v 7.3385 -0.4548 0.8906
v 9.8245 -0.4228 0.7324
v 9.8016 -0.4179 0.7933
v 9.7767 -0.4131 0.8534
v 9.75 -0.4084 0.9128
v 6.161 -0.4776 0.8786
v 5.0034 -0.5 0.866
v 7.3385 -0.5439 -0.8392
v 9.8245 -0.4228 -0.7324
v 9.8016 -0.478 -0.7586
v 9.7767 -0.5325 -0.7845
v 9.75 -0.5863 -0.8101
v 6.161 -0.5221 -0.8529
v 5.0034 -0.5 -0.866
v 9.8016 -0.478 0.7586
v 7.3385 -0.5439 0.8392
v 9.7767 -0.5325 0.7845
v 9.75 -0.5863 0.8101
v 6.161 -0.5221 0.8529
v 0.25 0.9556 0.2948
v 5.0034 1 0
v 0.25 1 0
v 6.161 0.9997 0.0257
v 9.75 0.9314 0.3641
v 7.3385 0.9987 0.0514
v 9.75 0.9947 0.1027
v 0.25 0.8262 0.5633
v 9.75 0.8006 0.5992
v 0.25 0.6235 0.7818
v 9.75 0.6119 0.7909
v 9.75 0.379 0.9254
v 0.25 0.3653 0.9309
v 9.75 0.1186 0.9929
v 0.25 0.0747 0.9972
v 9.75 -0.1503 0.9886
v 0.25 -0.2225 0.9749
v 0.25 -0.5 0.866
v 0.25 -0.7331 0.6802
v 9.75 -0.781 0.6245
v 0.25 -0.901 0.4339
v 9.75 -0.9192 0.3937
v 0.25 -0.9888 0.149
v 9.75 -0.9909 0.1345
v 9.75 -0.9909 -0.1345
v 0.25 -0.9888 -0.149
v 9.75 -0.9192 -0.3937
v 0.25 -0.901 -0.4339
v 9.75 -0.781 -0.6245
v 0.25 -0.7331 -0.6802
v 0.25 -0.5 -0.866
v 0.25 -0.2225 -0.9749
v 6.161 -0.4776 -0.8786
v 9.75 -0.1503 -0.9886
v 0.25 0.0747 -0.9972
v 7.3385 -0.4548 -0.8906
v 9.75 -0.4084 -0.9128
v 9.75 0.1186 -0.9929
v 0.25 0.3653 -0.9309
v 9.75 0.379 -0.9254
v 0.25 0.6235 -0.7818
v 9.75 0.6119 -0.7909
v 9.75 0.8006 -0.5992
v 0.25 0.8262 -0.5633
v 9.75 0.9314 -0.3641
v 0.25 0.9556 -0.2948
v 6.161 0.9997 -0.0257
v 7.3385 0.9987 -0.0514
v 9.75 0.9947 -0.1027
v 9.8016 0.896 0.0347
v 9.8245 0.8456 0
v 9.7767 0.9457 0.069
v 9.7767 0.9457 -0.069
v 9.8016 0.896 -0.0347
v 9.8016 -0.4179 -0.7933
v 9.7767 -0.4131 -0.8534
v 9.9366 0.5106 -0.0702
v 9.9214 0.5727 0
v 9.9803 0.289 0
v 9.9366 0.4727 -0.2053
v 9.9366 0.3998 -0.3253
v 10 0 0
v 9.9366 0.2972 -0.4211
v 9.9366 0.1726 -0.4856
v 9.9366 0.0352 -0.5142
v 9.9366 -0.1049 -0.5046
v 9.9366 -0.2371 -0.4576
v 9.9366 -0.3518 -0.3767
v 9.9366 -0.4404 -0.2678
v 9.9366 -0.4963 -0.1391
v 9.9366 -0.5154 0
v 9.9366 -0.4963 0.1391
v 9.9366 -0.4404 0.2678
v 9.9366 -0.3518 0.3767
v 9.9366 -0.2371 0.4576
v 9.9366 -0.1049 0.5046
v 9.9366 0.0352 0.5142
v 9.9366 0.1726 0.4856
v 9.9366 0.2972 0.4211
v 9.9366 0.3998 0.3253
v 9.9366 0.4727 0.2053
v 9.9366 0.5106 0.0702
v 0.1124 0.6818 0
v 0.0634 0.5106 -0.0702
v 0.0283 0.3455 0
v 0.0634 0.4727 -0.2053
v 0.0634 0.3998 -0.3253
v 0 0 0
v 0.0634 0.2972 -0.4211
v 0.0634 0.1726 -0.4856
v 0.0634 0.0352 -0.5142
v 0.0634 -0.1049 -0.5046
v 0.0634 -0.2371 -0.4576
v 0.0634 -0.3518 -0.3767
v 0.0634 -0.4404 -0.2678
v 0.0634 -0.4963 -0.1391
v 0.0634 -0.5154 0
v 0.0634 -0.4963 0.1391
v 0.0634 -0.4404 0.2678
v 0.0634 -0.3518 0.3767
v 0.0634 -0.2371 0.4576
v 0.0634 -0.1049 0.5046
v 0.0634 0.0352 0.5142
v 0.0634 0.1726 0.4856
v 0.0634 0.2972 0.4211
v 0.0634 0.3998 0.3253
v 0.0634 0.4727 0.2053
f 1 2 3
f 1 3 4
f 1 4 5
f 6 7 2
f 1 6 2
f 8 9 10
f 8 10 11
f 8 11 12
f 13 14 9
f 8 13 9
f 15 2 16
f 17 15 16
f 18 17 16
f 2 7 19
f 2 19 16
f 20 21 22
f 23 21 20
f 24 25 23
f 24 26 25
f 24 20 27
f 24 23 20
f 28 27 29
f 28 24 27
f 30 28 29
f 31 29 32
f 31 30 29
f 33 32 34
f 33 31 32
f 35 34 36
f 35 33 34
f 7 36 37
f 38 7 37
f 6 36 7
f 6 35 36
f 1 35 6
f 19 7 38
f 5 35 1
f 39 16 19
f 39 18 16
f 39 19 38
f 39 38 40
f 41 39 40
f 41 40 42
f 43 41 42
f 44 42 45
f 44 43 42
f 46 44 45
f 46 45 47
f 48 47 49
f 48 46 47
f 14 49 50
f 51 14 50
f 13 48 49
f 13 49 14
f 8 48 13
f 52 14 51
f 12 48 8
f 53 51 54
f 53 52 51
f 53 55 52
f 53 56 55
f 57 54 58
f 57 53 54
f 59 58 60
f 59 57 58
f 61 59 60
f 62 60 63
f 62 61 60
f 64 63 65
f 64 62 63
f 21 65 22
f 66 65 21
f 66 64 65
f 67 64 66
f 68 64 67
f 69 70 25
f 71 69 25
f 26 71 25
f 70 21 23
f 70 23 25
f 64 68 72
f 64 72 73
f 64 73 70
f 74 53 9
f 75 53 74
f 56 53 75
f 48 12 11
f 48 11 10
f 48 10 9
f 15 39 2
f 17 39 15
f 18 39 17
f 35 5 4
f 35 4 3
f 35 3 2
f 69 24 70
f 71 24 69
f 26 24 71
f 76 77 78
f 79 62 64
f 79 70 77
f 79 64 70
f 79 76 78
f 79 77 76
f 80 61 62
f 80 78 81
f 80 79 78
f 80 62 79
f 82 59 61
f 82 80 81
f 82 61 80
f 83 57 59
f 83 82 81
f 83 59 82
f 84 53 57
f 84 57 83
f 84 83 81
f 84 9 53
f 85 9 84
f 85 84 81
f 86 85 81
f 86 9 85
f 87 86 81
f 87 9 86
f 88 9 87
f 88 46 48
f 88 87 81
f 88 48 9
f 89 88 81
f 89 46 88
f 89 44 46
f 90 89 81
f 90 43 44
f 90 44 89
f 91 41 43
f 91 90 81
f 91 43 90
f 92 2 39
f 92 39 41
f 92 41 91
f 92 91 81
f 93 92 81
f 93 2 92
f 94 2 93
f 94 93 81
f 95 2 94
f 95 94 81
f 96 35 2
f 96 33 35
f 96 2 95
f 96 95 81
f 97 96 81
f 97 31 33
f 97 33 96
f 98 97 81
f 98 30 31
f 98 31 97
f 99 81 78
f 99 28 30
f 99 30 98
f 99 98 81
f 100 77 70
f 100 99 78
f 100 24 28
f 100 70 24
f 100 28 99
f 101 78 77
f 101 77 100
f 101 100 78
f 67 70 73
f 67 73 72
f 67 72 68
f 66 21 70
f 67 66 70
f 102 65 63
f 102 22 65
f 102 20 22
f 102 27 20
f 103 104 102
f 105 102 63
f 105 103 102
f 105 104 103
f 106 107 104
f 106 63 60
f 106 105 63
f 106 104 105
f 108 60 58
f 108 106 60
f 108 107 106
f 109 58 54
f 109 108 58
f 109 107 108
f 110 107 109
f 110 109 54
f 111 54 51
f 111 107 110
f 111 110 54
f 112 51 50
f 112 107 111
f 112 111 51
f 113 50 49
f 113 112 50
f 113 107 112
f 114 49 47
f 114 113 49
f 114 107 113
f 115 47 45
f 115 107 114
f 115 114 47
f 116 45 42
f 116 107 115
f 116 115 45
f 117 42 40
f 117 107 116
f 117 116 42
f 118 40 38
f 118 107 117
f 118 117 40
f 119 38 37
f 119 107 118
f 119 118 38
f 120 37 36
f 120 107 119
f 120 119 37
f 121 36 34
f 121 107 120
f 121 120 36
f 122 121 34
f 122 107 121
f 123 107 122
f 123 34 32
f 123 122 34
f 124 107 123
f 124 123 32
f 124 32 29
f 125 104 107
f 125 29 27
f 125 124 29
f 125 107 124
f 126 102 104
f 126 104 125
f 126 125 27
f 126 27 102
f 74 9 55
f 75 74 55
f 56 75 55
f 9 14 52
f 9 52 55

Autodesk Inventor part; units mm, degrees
ref_plane "YZ Plane" through (0, 0, 0) normal (1, 0, 0) x (0, 1, 0)
sketch "Skizze1" plane through (0, 0, 0) normal (0, 0, 1) x (1, 0, 0)
  line L0 (0, 0) -> (10, 0)
  line L1 (0.25, 1) -> (9.75, 1)
  arc A0 (0.25, 1) -> (0, 0) centre (2.125, 0) ccw
  arc A1 (10, 0) -> (9.75, 1) centre (7.875, 0) ccw
  line L2 (10, 0) -> (10, 0.84) construction
  line L3 (10, 0.84) -> (5, 1) construction
  line L4 (-12.8617, 0) -> (72.8617, 0) projected
  line L5 (0, 12.1847) -> (0, -2.0308) projected
  point P0 (5, 0)
  dimension "d0" = 2
  dimension "d1" = 10
  dimension "d2" = 1.68
  dimension "d12" = 5
  dimension "d17" = 0.25
  dimension "d18" = 0.25
revolve "Körper" add sketch "Skizze1" angle 360 about axis through (0, 0, 0) along (1, 0, 0)
ref_plane "Work Plane1" through (10, 0, 0) normal (1, 0, 0) x (0, 1, 0)
sketch "Skizze2" plane through (10, 0, 0) normal (1, 0, 0) x (0, 1, 0)
  line L0 (0, -14) -> (0, 14) projected
ref_plane "Work Plane2" through (10, 0, -10) normal (0.9995, -0.032, 0) x (0.032, 0.9995, 0)
sketch "Skizze3" plane through (10, 0, -10) normal (0.9995, -0.032, 0) x (0.032, 0.9995, 0)
  ellipse E0 centre (-0.008, 10) end of major axis (-0.008, 11) minor radius 0.9995 projected
  line L0 (-0.1599, 10) -> (0.8396, 10) projected
  line L1 (0.8396, 10) -> (0.9862, 10.1027)
  line L2 (0.8396, 10) -> (0.9862, 9.8973)
  arc A0 (0.9862, 9.8973) -> (0.9862, 10.1027) centre (-0.008, 10) ccw
  dimension "d7" = 70
extrude "Nut" cut sketch "Skizze3" against normal up to next contours L2 L1 E0 picked at (0.9387, 9.9486)
pattern_circular "Nuten" count 3 over 360 about axis through (5, 0, 0) along (1, 0, 0) of "Nut"
equation "\"d0\" = NND"
equation "\"d1\" = NLG"
equation "\"d2\" = 0.84 * NND"
equation "\"d17\" = KAH"
equation "\"d18\" = KAH"
equation "\"d8\" = 0.5 * NLG"
equation "\"NND\" = 2"
equation "\"NLG\" = 10"
equation "\"KAH\" = 0.25"
equation "\"d6\" = -d5"
equation "\"FAC\" = 0.5"
equation "\"NND1\" = 2.15"
equation "\"NLG1\" = 9.5"
properties part number "ISO 8745 - 2 x 10" material "Edelstahl, austenitisch"
